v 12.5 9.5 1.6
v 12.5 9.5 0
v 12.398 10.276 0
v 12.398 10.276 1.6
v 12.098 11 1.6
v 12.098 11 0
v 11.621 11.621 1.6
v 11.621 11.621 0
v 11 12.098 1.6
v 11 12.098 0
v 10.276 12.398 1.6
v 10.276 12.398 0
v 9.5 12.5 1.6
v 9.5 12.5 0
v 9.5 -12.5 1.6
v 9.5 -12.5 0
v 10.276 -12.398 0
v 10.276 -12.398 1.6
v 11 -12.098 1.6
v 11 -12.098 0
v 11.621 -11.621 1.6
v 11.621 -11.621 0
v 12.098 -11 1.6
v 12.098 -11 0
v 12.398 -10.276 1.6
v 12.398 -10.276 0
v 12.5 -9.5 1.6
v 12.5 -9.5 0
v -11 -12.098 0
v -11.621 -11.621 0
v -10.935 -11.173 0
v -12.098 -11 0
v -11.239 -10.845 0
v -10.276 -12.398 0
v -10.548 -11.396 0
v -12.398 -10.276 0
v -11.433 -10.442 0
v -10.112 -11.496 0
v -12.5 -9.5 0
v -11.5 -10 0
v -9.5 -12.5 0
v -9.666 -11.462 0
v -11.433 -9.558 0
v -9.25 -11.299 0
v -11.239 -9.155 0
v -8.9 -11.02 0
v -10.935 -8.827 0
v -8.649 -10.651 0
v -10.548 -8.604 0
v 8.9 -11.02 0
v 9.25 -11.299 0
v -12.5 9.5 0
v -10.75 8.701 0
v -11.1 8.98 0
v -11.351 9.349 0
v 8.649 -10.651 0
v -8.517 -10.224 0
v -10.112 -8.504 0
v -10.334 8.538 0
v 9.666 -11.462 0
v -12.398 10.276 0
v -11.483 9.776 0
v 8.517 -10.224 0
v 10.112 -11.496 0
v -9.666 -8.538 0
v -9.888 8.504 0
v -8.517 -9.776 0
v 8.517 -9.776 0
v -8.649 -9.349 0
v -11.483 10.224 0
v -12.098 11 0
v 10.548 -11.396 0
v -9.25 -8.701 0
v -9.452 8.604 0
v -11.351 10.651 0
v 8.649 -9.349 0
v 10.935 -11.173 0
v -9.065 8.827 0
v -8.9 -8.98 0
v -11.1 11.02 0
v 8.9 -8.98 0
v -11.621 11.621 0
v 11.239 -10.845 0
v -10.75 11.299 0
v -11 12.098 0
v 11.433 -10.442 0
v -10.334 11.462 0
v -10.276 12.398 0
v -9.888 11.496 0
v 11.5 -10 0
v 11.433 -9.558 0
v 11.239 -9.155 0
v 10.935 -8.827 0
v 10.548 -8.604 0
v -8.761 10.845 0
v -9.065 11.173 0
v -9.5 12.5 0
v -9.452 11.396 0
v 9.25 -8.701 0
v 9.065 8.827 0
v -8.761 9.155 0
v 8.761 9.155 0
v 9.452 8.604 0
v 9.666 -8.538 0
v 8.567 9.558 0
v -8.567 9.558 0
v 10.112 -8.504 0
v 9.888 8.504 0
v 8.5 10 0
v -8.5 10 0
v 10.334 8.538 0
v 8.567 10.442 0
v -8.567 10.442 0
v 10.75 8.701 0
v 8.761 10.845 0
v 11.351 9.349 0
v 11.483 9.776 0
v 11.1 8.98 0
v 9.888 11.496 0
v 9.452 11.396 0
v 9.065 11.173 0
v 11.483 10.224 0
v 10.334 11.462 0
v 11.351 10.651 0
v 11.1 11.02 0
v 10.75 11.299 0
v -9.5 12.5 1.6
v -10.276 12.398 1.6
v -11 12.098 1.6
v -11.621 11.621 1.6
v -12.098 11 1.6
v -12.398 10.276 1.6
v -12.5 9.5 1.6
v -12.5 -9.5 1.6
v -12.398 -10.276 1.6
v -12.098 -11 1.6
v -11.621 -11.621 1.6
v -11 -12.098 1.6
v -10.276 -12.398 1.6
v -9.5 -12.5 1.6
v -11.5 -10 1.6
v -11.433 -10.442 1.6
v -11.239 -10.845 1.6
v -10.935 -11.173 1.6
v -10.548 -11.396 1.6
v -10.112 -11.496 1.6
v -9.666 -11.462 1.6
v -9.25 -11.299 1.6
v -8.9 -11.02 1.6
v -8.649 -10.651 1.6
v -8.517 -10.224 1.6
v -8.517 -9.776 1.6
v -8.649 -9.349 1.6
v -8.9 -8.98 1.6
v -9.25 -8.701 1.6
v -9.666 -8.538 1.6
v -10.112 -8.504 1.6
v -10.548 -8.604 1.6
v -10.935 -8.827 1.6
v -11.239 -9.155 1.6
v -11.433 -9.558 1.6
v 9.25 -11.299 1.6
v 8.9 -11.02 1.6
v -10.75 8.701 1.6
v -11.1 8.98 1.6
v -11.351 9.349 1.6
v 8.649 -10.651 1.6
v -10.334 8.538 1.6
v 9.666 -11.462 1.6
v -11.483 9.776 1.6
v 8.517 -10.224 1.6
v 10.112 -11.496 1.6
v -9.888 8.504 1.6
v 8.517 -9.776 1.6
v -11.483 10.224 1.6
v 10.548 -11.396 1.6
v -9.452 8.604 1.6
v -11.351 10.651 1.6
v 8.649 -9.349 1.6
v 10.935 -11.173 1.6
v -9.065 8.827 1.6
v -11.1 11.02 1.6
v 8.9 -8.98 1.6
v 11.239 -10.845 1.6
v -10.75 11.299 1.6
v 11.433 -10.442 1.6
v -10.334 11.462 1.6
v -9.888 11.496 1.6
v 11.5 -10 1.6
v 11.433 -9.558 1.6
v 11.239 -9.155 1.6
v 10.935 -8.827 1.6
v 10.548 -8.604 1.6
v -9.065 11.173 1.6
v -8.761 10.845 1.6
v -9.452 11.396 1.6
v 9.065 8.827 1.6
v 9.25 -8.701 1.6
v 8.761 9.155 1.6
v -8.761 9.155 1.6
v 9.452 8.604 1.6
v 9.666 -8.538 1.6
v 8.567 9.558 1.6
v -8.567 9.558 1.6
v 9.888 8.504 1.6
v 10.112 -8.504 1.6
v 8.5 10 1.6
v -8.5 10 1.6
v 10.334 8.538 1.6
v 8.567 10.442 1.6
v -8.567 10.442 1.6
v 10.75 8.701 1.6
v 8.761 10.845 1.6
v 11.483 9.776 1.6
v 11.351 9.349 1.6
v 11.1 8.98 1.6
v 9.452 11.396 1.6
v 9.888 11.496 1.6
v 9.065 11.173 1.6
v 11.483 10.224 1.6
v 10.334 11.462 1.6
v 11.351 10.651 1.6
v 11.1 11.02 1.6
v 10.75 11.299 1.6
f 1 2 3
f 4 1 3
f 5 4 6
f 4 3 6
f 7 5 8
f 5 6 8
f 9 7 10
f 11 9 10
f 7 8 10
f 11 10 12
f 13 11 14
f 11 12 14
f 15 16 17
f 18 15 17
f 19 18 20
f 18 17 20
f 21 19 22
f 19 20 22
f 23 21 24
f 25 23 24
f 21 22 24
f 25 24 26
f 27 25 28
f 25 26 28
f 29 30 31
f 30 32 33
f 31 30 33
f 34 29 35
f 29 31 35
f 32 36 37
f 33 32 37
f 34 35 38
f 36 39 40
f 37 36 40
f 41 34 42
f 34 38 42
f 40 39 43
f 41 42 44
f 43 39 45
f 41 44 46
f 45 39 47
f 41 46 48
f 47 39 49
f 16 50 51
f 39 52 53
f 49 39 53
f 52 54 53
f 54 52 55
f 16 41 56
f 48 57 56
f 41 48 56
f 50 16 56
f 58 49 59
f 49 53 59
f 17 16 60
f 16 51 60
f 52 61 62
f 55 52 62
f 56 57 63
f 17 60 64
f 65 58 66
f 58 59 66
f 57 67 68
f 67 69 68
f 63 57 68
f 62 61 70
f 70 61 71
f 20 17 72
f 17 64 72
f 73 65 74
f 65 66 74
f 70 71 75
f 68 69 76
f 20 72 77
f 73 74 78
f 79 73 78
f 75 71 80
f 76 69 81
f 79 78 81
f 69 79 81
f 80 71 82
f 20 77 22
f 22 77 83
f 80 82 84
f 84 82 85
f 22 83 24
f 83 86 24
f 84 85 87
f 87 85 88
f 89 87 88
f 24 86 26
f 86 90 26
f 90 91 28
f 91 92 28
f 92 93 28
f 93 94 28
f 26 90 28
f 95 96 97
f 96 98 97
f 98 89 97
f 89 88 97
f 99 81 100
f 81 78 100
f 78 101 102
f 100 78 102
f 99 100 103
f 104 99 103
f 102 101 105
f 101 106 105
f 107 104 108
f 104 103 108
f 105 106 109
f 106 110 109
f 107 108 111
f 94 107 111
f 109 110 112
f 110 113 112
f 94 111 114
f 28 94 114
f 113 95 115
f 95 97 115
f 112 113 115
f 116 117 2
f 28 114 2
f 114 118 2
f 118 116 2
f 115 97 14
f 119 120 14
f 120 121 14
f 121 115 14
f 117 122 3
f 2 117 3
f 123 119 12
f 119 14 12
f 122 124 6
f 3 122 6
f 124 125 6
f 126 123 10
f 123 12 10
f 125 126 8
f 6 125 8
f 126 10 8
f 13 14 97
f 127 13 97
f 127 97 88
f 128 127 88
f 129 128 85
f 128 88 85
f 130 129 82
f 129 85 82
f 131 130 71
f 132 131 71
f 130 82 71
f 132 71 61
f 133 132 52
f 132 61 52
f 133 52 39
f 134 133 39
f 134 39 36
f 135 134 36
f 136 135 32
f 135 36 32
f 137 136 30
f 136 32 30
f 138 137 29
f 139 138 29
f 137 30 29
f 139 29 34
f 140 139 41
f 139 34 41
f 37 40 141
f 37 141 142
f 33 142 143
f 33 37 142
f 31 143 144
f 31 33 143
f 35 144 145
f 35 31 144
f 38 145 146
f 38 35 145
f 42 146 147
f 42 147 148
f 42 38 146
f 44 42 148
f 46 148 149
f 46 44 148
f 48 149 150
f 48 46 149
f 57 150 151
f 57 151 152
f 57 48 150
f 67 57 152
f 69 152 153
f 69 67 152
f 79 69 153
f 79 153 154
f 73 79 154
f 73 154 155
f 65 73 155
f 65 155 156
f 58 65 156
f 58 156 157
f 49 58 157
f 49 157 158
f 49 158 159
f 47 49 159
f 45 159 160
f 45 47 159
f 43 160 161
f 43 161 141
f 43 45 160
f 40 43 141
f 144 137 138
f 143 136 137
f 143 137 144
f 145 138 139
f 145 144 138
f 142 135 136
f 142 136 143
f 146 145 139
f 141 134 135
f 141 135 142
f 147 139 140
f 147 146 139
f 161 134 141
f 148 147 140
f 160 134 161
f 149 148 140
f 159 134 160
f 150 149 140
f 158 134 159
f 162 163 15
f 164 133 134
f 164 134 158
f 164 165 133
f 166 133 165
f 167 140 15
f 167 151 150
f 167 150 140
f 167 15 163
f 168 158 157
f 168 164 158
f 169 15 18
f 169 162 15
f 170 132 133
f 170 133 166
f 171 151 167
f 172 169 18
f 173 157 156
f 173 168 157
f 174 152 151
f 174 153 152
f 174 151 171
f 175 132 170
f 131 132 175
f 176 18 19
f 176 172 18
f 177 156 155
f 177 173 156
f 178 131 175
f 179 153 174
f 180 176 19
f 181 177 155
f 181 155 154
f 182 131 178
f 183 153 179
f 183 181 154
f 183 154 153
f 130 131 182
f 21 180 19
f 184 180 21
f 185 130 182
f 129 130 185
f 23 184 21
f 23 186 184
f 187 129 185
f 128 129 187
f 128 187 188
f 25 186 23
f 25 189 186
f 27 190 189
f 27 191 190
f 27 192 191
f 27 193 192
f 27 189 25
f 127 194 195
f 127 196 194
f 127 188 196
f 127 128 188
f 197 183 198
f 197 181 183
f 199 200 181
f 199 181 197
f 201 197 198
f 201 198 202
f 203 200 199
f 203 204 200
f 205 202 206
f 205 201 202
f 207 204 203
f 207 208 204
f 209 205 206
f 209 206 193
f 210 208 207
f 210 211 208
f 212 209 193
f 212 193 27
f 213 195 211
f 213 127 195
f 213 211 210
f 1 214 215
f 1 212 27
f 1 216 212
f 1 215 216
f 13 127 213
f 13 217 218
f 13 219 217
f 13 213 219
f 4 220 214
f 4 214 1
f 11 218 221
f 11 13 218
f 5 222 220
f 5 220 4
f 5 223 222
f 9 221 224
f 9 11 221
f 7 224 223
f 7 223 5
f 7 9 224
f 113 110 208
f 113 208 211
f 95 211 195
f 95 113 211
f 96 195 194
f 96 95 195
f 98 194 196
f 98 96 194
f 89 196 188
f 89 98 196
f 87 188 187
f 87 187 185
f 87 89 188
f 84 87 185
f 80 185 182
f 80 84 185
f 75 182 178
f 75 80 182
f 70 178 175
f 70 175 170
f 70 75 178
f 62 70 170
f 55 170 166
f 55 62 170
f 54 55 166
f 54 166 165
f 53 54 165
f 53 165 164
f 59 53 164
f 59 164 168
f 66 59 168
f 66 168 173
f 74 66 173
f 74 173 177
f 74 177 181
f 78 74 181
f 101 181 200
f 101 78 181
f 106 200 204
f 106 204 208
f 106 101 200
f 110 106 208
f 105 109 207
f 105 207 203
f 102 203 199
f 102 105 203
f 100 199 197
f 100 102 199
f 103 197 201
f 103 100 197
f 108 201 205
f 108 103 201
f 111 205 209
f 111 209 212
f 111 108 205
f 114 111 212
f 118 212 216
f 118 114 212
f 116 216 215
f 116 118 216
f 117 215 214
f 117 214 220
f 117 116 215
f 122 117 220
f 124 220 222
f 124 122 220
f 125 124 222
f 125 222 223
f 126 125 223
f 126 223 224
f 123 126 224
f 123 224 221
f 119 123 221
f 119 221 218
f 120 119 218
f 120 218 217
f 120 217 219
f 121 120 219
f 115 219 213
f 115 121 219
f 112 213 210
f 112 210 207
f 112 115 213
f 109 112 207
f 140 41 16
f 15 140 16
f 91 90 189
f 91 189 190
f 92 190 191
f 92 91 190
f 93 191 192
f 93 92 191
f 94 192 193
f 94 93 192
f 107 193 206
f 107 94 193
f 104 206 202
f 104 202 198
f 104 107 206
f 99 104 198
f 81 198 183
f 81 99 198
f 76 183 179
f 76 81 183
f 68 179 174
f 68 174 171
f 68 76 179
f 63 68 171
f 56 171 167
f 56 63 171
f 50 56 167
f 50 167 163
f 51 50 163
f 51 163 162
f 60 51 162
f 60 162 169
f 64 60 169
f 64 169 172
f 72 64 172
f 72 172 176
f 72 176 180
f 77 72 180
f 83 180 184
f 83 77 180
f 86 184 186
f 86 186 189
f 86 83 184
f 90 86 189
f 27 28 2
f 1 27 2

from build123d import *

# Parameters (mm, degrees)
SKETCH1_R           = 1.5
BOSS_EXTRUDE1_DEPTH = 1.6


with BuildPart() as part:
    # Sketch1 → Boss-Extrude1 (new body)
    with BuildSketch(Plane.XY):
        with BuildLine():
            Line((-9.5, -12.5), (9.5, -12.5))
            ThreePointArc((9.5, -12.5), (11.621320344, -11.621320344), (12.5, -9.5))
            Line((12.5, -9.5), (12.5, 9.5))
            ThreePointArc((12.5, 9.5), (11.621320344, 11.621320344), (9.5, 12.5))
            Line((9.5, 12.5), (-9.5, 12.5))
            ThreePointArc((-9.5, 12.5), (-11.621320344, 11.621320344), (-12.5, 9.5))
            Line((-12.5, 9.5), (-12.5, -9.5))
            ThreePointArc((-12.5, -9.5), (-11.621320344, -11.621320344), (-9.5, -12.5))
        make_face()
        with Locations((-10, 10)):
            Circle(SKETCH1_R, mode=Mode.SUBTRACT)
        with Locations(Location((10, 10, 0), (0, 0, 180))):
            Circle(SKETCH1_R, mode=Mode.SUBTRACT)
        with Locations((10, -10)):
            Circle(SKETCH1_R, mode=Mode.SUBTRACT)
        with Locations(Location((-10, -10, 0), (0, 0, 180))):
            Circle(SKETCH1_R, mode=Mode.SUBTRACT)
    extrude(amount=BOSS_EXTRUDE1_DEPTH)


solid = part.part
